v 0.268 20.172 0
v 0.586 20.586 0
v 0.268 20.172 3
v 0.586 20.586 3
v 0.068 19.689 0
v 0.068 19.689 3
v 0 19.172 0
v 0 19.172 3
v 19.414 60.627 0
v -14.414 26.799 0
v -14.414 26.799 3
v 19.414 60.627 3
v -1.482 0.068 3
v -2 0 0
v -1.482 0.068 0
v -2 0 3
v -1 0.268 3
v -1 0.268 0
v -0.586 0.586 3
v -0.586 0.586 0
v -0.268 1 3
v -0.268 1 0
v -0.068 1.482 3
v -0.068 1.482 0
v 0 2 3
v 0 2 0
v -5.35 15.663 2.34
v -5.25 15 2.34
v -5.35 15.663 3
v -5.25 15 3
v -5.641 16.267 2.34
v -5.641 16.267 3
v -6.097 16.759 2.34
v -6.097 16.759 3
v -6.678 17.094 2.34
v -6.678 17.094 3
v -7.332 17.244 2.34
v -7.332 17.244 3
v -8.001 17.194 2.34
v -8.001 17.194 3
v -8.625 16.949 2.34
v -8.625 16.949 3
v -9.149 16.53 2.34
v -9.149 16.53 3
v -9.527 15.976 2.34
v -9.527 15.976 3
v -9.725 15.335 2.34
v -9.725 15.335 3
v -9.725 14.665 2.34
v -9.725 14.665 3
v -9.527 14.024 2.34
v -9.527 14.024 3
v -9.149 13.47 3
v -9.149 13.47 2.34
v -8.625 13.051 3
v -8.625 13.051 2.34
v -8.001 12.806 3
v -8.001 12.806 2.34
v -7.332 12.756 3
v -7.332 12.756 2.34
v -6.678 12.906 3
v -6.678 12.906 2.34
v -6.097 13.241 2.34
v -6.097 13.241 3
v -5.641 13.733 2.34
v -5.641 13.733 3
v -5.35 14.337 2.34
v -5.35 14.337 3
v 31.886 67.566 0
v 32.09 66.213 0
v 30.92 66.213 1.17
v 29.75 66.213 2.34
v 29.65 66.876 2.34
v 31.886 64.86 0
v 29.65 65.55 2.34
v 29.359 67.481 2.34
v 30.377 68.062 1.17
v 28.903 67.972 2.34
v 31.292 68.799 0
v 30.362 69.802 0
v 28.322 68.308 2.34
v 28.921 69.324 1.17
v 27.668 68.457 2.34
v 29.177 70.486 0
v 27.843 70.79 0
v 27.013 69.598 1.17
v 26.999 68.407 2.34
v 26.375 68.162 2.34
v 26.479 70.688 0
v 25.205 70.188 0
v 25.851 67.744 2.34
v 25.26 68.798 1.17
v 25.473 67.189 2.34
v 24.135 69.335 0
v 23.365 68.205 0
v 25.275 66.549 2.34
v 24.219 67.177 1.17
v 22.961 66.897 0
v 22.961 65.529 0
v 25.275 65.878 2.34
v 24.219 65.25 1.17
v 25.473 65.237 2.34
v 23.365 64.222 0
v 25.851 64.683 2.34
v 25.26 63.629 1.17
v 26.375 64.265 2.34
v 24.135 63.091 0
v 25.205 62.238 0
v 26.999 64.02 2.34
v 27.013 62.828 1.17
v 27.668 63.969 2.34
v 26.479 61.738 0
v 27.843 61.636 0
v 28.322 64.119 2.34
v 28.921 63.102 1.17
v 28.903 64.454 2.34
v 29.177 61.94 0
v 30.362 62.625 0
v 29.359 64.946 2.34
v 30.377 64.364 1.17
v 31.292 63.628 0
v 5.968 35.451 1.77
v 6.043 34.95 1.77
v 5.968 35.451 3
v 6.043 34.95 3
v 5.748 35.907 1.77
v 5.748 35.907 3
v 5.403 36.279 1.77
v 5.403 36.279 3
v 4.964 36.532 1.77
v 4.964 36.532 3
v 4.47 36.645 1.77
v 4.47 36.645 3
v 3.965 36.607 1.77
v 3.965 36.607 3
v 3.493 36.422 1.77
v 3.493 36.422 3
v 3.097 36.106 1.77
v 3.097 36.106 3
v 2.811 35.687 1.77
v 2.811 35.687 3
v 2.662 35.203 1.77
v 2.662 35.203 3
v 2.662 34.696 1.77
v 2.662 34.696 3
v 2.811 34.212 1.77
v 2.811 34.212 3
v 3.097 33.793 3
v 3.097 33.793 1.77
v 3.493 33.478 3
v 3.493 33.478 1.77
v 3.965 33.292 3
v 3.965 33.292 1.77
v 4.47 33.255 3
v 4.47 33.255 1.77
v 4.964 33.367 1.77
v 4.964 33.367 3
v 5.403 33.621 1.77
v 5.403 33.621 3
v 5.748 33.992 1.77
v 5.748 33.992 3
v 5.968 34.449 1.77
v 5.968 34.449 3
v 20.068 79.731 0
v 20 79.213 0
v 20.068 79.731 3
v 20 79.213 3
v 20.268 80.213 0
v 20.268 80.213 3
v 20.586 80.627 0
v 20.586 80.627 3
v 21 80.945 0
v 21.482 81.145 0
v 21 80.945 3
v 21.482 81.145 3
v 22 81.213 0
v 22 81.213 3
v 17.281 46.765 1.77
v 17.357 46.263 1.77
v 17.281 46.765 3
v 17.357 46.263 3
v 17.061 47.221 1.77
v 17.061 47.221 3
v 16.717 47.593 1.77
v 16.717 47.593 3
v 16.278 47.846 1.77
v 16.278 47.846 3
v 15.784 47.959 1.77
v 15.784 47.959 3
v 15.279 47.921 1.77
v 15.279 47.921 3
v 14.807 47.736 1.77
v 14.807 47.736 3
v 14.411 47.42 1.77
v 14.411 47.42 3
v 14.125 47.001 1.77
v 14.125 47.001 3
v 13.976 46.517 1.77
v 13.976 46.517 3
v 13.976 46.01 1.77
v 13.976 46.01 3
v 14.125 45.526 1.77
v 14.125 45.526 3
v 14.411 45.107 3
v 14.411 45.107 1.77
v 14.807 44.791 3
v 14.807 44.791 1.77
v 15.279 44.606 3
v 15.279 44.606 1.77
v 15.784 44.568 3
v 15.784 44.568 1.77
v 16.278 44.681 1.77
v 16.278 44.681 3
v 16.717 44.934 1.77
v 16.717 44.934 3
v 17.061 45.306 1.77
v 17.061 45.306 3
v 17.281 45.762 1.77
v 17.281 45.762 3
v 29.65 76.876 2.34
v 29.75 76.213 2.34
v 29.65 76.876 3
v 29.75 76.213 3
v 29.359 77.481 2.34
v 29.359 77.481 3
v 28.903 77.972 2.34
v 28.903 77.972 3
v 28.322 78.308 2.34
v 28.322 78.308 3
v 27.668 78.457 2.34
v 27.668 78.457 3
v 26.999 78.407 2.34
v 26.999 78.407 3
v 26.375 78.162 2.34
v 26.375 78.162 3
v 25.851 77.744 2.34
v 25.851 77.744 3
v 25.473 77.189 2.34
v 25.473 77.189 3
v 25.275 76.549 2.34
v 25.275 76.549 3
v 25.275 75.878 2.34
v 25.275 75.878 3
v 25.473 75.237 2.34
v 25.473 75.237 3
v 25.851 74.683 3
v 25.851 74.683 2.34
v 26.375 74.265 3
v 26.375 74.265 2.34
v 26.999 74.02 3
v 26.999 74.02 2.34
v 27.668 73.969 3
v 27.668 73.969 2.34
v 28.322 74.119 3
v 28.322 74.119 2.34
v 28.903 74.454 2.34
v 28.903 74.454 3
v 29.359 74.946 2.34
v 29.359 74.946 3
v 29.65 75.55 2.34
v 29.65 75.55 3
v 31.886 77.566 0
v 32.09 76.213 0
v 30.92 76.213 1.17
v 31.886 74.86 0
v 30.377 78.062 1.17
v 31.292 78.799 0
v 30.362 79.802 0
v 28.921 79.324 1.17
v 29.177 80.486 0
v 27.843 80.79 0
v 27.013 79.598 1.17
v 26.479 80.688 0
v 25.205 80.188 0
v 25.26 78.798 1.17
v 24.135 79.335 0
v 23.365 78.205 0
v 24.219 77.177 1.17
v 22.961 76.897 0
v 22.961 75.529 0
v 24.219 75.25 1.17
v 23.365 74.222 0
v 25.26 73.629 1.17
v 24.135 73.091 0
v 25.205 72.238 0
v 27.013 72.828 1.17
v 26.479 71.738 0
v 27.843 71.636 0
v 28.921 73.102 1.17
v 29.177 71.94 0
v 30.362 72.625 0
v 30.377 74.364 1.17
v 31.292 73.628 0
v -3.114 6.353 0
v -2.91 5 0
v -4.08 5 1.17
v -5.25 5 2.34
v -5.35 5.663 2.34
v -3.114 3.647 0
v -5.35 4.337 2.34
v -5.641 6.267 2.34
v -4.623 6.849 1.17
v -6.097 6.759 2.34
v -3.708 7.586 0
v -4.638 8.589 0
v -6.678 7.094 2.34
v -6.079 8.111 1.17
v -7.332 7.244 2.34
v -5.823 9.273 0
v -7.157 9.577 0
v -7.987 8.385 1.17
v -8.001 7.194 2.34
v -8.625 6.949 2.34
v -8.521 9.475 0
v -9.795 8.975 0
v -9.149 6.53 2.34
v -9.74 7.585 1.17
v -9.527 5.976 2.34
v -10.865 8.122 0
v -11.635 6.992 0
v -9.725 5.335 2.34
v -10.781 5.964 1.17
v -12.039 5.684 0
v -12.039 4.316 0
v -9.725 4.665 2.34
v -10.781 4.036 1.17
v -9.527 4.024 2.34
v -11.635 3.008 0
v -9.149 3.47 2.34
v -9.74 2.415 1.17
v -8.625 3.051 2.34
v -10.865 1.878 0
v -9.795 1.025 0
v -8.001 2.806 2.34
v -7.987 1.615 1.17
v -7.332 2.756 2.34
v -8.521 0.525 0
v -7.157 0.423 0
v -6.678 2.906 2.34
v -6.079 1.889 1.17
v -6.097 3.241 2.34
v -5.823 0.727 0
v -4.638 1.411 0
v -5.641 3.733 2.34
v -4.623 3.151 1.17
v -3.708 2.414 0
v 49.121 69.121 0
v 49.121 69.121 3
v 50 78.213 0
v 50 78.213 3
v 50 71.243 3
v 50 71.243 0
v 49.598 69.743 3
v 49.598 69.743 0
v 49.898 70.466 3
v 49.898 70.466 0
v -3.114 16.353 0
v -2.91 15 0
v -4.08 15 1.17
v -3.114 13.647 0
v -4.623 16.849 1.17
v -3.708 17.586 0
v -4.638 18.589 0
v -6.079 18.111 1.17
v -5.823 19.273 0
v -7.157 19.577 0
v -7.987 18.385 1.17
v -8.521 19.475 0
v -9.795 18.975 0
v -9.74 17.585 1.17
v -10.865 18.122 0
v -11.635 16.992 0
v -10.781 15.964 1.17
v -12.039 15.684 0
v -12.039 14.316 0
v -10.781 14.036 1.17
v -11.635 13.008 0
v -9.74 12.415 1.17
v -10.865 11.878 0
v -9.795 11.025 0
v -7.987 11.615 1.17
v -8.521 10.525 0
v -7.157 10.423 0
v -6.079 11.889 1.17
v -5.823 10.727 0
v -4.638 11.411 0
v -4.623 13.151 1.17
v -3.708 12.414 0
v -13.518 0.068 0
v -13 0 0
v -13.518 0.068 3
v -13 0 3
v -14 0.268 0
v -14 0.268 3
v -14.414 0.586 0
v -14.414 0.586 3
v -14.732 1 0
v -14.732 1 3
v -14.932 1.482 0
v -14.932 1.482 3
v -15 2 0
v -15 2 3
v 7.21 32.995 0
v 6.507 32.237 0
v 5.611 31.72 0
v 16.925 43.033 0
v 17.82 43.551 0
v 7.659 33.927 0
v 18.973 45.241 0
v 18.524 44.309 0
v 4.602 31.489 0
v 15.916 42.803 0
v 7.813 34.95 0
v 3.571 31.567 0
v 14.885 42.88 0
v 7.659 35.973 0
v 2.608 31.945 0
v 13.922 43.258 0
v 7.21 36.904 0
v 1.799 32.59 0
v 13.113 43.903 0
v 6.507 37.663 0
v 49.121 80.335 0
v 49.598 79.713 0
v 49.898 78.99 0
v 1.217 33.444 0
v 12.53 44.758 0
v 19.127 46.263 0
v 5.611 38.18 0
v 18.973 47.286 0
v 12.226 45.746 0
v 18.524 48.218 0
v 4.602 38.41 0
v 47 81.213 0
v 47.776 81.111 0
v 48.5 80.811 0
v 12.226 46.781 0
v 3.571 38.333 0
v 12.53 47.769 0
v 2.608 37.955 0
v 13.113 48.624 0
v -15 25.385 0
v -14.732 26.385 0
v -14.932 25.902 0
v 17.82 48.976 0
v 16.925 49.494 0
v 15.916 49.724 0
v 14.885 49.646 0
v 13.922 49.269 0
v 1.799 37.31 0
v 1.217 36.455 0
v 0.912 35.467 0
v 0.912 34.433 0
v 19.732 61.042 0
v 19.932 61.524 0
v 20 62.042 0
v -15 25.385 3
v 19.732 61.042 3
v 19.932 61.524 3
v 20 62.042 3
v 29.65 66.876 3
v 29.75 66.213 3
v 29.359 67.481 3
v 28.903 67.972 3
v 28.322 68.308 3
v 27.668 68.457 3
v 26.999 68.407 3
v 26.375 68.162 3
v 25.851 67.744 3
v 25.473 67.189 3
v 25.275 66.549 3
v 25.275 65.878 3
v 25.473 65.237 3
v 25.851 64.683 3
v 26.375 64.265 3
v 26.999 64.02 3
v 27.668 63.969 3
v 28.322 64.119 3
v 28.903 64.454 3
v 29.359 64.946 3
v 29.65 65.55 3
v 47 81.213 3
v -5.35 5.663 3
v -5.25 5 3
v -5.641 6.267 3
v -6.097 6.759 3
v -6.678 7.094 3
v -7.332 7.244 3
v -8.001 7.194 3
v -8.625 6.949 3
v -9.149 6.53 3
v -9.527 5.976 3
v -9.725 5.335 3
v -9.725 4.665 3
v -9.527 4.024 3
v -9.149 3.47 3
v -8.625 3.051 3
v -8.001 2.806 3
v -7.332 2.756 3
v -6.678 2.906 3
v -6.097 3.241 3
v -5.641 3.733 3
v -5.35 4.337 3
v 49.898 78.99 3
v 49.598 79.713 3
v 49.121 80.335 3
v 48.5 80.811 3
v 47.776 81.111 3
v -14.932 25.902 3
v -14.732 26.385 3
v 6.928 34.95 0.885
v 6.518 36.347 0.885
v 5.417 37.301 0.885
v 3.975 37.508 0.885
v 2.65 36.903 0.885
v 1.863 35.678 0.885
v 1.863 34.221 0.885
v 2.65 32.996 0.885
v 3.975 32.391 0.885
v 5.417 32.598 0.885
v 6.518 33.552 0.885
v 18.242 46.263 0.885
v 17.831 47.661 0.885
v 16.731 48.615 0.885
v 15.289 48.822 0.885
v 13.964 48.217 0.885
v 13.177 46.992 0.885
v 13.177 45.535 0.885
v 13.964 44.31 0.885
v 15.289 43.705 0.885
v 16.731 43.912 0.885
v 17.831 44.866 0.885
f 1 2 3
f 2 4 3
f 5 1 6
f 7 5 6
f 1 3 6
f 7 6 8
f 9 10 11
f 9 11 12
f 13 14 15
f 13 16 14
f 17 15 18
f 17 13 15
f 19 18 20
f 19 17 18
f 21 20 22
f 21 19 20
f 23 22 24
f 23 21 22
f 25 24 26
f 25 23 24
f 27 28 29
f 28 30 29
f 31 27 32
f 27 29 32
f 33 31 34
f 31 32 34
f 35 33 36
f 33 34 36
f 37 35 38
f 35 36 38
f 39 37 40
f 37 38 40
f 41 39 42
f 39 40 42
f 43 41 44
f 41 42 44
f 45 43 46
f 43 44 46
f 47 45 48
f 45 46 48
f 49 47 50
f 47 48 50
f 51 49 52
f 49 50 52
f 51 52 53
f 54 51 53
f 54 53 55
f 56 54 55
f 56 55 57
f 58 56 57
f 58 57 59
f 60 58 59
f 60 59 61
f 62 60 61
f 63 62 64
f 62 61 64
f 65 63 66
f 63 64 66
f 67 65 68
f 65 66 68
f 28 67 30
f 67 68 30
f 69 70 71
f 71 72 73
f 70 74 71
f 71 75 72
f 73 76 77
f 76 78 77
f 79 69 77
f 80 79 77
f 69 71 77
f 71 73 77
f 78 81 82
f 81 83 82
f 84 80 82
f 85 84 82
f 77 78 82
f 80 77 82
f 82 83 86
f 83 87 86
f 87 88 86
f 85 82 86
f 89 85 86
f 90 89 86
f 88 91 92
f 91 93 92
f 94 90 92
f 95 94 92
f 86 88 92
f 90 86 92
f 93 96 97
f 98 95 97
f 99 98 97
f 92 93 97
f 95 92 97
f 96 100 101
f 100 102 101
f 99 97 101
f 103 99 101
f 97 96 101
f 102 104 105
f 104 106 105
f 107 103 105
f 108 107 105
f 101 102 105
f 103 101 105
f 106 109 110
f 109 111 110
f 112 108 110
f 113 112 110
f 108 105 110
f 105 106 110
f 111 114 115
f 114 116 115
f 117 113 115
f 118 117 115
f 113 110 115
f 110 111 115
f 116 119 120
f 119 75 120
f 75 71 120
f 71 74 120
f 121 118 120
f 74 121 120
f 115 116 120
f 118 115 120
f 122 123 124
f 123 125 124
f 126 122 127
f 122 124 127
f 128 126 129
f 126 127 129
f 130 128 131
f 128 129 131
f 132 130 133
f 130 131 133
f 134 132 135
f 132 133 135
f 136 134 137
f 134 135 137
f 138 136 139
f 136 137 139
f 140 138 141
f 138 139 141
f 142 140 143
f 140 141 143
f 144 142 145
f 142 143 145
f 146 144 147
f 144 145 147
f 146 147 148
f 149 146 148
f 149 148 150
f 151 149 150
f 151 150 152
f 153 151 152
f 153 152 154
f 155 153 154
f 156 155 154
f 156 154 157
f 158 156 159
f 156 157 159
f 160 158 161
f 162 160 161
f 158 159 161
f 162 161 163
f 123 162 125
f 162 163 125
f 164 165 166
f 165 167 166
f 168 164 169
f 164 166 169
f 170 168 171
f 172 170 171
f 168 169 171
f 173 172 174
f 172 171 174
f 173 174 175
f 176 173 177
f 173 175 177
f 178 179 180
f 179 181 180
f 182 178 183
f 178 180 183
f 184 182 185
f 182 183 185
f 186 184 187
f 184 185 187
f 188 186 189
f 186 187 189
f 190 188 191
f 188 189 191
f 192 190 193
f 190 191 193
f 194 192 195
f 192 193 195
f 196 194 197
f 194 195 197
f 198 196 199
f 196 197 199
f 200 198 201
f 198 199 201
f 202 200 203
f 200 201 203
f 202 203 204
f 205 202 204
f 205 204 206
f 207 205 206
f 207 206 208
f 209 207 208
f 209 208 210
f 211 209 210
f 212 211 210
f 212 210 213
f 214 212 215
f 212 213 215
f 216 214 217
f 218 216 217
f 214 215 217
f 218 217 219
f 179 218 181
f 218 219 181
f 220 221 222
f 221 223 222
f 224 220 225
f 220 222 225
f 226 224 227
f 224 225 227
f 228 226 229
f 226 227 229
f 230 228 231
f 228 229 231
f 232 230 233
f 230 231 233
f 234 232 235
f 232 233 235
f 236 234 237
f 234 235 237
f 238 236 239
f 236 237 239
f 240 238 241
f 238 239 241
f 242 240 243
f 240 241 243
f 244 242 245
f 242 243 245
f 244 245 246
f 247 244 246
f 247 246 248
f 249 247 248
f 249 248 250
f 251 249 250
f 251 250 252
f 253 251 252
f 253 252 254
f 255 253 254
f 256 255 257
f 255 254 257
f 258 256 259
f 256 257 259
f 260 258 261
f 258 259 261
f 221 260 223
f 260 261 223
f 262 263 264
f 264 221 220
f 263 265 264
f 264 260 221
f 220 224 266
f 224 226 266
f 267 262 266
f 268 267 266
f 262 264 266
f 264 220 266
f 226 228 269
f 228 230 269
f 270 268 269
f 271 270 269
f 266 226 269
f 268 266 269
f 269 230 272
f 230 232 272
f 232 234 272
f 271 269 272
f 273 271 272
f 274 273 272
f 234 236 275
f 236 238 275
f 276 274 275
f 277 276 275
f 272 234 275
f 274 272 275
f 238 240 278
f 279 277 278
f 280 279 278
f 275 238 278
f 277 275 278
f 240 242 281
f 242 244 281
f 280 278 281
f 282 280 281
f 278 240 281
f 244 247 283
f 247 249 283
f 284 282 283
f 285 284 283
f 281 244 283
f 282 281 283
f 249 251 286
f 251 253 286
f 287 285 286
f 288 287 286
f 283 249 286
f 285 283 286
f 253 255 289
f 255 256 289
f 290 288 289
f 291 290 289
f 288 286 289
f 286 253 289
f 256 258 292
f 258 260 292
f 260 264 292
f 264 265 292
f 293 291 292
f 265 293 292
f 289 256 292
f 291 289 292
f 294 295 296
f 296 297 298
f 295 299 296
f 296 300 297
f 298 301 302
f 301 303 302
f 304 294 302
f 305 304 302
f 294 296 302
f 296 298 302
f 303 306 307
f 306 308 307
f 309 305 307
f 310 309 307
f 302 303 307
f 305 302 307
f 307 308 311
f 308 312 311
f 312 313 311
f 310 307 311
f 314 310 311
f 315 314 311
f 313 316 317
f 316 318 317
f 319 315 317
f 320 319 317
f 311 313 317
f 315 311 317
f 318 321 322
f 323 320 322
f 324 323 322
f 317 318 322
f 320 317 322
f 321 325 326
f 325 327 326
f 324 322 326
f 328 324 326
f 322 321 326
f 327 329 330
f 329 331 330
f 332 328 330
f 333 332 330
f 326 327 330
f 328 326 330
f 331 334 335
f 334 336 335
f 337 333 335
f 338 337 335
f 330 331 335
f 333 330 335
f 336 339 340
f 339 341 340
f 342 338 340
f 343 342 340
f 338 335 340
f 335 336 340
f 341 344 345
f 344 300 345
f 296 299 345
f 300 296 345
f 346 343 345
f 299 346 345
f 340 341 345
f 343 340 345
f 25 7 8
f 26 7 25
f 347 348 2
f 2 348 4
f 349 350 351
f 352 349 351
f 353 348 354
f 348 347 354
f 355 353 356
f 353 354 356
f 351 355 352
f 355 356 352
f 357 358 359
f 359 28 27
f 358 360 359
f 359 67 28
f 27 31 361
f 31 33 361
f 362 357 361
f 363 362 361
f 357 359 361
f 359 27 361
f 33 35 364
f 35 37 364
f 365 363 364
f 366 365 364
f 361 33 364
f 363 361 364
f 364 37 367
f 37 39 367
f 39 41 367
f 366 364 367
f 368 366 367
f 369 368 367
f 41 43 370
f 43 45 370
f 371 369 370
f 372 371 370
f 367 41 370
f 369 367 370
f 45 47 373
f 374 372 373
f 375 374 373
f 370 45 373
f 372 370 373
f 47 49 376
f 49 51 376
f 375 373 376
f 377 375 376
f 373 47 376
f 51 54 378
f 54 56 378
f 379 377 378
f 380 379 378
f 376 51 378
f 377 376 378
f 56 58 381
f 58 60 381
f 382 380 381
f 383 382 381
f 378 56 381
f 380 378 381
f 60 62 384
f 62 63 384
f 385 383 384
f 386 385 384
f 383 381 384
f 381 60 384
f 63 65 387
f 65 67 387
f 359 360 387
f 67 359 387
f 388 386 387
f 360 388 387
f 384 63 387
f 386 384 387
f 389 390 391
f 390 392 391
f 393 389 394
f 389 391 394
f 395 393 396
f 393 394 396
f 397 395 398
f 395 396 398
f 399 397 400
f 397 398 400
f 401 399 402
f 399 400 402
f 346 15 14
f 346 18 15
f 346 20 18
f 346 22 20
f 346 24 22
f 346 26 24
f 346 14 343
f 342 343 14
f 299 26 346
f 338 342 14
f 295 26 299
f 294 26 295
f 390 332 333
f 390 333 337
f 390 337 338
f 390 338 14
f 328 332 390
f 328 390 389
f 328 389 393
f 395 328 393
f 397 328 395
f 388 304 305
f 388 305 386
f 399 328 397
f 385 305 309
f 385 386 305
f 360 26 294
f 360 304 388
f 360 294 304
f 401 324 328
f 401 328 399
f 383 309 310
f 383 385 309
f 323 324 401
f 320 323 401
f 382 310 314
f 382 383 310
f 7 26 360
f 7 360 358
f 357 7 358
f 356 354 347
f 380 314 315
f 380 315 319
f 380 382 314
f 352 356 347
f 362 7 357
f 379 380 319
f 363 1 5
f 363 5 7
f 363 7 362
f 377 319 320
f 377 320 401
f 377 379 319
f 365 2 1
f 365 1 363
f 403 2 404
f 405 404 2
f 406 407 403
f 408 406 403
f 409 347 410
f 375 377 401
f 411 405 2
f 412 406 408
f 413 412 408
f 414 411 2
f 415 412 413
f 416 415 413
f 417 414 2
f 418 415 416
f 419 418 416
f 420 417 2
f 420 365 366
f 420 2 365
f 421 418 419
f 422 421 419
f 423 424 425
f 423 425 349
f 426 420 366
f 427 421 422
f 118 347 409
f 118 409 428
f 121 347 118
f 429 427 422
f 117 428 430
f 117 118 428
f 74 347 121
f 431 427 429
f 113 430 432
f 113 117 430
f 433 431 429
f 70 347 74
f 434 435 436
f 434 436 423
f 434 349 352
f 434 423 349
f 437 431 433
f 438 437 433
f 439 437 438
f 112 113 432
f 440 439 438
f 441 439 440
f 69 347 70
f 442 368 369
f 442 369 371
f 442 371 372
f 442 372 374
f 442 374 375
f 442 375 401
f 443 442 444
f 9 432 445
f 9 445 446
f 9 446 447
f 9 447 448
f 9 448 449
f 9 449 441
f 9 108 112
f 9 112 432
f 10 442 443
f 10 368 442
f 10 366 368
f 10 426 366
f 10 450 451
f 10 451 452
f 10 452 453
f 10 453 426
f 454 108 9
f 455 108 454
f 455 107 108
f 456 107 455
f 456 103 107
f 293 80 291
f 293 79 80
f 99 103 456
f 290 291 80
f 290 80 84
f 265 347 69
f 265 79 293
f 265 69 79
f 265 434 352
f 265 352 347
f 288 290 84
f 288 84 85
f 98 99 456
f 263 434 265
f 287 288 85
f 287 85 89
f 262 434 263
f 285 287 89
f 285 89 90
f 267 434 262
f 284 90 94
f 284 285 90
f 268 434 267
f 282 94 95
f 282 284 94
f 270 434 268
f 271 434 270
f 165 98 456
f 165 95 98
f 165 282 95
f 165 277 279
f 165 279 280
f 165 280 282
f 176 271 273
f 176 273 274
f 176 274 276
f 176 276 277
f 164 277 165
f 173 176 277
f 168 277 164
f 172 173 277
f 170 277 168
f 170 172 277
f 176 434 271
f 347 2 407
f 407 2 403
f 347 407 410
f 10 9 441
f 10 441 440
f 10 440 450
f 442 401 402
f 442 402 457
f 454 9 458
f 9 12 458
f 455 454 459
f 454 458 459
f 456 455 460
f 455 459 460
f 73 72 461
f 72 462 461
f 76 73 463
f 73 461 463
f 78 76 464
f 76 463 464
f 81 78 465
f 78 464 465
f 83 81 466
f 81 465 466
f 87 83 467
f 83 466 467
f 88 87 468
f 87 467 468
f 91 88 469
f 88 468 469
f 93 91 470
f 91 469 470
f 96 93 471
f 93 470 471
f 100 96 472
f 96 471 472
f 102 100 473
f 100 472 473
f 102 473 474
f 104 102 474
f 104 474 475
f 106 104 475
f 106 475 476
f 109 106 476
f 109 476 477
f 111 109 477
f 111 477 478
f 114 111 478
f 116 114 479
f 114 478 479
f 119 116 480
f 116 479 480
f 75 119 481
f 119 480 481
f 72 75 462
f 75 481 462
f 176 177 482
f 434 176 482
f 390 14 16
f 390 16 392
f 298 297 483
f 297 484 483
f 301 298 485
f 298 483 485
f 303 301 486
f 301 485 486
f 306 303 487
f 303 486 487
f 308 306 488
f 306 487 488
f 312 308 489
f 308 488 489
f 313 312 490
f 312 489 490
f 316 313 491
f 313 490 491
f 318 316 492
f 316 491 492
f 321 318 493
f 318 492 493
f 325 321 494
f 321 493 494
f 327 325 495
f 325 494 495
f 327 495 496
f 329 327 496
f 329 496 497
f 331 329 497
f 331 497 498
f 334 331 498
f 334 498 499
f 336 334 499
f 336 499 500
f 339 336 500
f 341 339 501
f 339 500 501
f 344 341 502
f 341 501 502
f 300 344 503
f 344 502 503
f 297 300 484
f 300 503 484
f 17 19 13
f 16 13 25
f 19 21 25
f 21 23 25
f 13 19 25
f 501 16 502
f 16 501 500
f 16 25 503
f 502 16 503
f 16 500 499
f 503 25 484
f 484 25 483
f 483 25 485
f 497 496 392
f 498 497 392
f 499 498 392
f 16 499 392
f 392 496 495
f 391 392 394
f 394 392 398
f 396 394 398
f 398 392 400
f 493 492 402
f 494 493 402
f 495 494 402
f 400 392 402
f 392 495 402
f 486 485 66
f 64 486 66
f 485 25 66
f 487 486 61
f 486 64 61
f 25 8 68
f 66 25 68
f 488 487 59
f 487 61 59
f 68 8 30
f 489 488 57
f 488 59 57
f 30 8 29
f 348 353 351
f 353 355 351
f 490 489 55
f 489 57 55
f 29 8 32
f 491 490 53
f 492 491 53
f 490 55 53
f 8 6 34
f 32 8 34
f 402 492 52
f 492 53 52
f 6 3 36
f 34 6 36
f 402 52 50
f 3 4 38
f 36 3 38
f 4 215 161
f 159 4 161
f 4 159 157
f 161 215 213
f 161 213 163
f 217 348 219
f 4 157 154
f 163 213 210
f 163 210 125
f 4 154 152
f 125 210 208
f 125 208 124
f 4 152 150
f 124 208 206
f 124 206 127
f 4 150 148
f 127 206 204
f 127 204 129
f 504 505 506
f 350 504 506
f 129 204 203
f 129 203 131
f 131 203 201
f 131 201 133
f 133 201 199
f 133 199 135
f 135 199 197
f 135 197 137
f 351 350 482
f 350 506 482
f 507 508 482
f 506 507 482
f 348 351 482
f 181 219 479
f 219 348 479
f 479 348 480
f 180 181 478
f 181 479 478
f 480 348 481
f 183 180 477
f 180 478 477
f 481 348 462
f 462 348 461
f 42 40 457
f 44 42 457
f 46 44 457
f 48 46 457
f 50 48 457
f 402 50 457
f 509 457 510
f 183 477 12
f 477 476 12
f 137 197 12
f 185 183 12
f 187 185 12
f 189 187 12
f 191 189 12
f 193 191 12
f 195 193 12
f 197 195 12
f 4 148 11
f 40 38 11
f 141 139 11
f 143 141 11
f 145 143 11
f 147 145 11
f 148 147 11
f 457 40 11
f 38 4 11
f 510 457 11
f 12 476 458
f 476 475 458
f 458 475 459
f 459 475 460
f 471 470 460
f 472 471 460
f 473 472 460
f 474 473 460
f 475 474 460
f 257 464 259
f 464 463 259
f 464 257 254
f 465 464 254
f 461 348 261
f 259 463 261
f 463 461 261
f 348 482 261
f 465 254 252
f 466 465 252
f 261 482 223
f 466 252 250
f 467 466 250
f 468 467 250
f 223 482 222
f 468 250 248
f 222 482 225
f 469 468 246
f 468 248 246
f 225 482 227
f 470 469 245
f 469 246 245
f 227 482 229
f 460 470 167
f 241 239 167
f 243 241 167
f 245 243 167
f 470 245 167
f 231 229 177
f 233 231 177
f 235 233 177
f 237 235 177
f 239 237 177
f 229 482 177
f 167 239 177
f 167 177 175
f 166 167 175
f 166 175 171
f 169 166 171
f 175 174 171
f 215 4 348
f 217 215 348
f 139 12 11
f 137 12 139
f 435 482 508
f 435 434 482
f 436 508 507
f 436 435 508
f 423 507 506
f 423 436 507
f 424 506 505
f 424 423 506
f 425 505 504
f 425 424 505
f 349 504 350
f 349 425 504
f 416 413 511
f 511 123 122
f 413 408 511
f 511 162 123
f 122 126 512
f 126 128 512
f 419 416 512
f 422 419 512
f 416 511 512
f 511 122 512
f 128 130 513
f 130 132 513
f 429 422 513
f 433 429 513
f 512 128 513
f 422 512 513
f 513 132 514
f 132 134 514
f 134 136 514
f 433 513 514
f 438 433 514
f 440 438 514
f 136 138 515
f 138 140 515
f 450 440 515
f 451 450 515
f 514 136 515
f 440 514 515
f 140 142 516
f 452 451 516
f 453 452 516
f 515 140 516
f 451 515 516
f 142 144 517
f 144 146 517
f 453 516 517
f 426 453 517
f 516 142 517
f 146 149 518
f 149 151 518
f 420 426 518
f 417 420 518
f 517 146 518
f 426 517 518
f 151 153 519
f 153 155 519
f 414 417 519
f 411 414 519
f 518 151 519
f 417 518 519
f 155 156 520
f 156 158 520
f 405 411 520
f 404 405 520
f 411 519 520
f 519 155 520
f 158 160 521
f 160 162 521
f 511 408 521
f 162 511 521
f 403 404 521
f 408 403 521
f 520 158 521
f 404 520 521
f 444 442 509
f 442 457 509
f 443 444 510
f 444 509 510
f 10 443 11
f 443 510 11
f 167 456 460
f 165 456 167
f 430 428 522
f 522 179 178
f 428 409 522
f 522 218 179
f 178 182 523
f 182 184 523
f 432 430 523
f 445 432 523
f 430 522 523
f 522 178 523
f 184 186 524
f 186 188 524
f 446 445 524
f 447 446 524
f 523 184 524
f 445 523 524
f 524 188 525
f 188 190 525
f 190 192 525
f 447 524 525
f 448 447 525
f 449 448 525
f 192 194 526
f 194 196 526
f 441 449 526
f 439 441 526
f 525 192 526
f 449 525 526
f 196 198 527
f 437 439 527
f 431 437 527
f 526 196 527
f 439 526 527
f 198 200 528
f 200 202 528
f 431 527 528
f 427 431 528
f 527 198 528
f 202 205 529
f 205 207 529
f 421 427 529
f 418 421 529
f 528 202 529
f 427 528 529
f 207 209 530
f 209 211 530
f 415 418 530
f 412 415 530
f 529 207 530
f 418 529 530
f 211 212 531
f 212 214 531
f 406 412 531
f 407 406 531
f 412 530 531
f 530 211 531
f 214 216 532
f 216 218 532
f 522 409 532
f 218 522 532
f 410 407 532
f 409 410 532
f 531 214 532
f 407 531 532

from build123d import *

# Parameters (mm, degrees)
EXTRUDE_1_DEPTH              = 3
FILLET_1_R                   = 2
HOLE_WIZARD_M4_1_D           = 4.5
HOLE_WIZARD_M4_1_DEPTH       = 24.5
HOLE_WIZARD_M4_1_CSINK_D     = 9.18
HOLE_WIZARD_M4_1_CSINK_ANGLE = 90
HOLE_WIZARD_M4_1_TIP         = 1.351936393
HOLE_WIZARD_M3_1_D           = 3.4
HOLE_WIZARD_M3_1_DEPTH       = 24.5
HOLE_WIZARD_M3_1_CSINK_D     = 6.94
HOLE_WIZARD_M3_1_CSINK_ANGLE = 90
HOLE_WIZARD_M3_1_TIP         = 1.021463052
EXTRUDE_START                = -3
EXTRUDE_2_DEPTH              = 3
FILLET_2_R                   = 3


with BuildPart() as part:
    # 草图1 → 凸台-拉伸1 (new body)
    with BuildSketch(Plane.XY):
        Polygon((0, 0), (-15, 0), (-15, 26.213203436), (20, 61.213203436), (20, 81.213203436), (35, 81.213203436), (35, 55), (0, 20), align=None)
    extrude(amount=EXTRUDE_1_DEPTH)

    # 圆角1
    fillet_1_edges = [part.edges().sort_by_distance(p)[0] for p in [
        (0, 0, 1.5),
        (-15, 0, 1.5),
        (-15, 26.213203436, 1.5),
        (20, 61.213203436, 1.5),
        (20, 81.213203436, 1.5),
        (35, 81.213203436, 1.5),
        (35, 55, 1.5),
        (0, 20, 1.5),
    ]]
    fillet(fillet_1_edges, radius=FILLET_1_R)

    # M4 六角凹锥坑头螺钉的锥形沉头孔1
    with Locations(Plane(origin=(27.5, 76.213203436, 0), x_dir=(-1, 0, 0), z_dir=(0, 0, -1))):
        with Locations((0, 0), (0, -10), (35, -61.213203436), (35, -71.213203436)):
            CounterSinkHole(HOLE_WIZARD_M4_1_D / 2, HOLE_WIZARD_M4_1_CSINK_D / 2, depth=HOLE_WIZARD_M4_1_DEPTH, counter_sink_angle=HOLE_WIZARD_M4_1_CSINK_ANGLE)
            with Locations((0, 0, -(HOLE_WIZARD_M4_1_DEPTH + HOLE_WIZARD_M4_1_TIP / 2))):  # 118° drill point
                Cone(0, HOLE_WIZARD_M4_1_D / 2, HOLE_WIZARD_M4_1_TIP, mode=Mode.SUBTRACT)

    # M3 六角凹锥坑头螺钉的锥形沉头孔1
    with Locations(Plane(origin=(15.656854249, 46.263455967, 0), x_dir=(-1, 0, 0), z_dir=(0, 0, -1))):
        with Locations((0, 0), (11.313708498, -11.313708499)):
            CounterSinkHole(HOLE_WIZARD_M3_1_D / 2, HOLE_WIZARD_M3_1_CSINK_D / 2, depth=HOLE_WIZARD_M3_1_DEPTH, counter_sink_angle=HOLE_WIZARD_M3_1_CSINK_ANGLE)
            with Locations((0, 0, -(HOLE_WIZARD_M3_1_DEPTH + HOLE_WIZARD_M3_1_TIP / 2))):  # 118° drill point
                Cone(0, HOLE_WIZARD_M3_1_D / 2, HOLE_WIZARD_M3_1_TIP, mode=Mode.SUBTRACT)

    # 草图5 → 凸台-拉伸2 (add)
    with BuildSketch(Plane(origin=(0, 0, 0), x_dir=(-1, 0, 0), z_dir=(0, 0, -1)).offset(EXTRUDE_START)):
        with BuildLine():
            Line((-33, 81.213203436), (-50, 81.213203436))
            Line((-50, 81.213203436), (-50, 70))
            Line((-50, 70), (-34.414213562, 54.414213562))
            ThreePointArc((-34.414213562, 54.414213562), (-34.847759065, 55.06306026), (-35, 55.828427125))
            Line((-35, 55.828427125), (-35, 79.213203436))
            ThreePointArc((-35, 79.213203436), (-34.414213562, 80.627416998), (-33, 81.213203436))
        make_face()
    extrude(amount=EXTRUDE_2_DEPTH)

    # 圆角2
    fillet_2_edges = [part.edges().sort_by_distance(p)[0] for p in [
        (50, 70, 1.5),
        (50, 81.213203436, 1.5),
    ]]
    fillet(fillet_2_edges, radius=FILLET_2_R)


solid = part.part
